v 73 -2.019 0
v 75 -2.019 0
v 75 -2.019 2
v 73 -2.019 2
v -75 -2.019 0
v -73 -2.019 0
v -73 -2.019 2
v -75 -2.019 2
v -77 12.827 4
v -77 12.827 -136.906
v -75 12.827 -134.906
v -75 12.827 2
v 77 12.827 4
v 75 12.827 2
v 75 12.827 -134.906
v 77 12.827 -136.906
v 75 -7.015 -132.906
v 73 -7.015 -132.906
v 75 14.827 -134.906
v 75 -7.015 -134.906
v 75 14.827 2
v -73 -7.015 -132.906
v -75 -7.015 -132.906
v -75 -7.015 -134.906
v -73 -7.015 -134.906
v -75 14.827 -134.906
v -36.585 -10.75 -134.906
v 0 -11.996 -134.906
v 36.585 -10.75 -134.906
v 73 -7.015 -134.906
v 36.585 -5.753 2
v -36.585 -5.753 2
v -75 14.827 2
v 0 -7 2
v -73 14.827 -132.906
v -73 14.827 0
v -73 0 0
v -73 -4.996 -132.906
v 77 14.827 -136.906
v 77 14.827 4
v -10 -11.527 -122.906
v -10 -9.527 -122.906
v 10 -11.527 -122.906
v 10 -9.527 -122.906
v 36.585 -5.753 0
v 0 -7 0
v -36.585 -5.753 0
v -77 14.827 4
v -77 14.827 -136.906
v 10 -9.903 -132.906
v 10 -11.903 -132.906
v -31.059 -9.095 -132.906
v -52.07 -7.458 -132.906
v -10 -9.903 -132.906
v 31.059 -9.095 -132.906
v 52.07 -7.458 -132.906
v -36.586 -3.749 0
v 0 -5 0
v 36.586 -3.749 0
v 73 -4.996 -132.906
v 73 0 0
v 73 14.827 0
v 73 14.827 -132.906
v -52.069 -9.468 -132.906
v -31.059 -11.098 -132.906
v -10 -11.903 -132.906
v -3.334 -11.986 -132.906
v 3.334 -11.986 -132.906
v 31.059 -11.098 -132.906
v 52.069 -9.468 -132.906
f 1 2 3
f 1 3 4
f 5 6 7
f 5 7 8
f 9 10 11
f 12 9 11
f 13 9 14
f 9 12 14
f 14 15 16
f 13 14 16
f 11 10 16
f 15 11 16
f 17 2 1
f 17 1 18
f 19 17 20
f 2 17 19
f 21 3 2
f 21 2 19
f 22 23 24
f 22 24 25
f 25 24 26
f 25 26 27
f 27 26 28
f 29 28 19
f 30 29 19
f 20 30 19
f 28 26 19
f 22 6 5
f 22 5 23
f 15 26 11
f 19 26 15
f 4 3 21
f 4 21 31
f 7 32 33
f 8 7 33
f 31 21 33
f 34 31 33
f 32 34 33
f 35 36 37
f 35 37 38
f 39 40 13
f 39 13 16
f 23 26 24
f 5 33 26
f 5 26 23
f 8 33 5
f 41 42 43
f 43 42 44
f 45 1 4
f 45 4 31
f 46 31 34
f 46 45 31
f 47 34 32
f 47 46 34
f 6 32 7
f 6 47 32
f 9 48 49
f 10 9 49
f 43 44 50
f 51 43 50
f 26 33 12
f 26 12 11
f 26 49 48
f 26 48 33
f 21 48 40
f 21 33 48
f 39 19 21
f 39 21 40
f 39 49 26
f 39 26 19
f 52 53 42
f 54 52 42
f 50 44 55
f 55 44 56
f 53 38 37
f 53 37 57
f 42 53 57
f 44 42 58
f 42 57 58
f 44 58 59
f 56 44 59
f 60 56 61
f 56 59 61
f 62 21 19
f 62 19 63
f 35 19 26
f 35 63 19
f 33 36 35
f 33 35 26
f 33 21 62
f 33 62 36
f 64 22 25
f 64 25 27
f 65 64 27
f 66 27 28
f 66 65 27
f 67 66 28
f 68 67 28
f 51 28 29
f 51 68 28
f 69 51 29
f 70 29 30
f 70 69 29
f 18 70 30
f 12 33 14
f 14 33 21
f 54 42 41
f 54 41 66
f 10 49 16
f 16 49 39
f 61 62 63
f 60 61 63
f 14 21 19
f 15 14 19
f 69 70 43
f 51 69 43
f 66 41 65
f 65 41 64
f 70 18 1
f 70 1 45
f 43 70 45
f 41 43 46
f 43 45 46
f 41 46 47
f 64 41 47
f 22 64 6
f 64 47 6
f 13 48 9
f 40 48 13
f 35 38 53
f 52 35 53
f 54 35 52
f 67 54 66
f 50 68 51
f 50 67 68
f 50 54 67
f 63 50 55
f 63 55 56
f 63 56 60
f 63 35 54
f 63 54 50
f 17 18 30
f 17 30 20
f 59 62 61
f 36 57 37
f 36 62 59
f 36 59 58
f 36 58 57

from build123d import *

# Parameters (mm, degrees)
BOSS_EXTRUDE1_DEPTH = 133
BOSS_EXTRUDE2_DEPTH = 2
LPATTERN1_COUNT     = 2
LPATTERN1_PITCH     = 148
BOSS_EXTRUDE3_DEPTH = 2
BOSS_EXTRUDE4_DEPTH = 2
SKETCH10_W          = 154
SKETCH10_H          = 140.906114543
SKETCH10_W_2        = 150
SKETCH10_H_2        = 136.906114543
BOSS_EXTRUDE5_DEPTH = 2
SKETCH11_W          = 20
SKETCH11_H          = 10
CUT_EXTRUDE1_DEPTH  = 160.348074773


with BuildPart() as part:
    # Sketch1 → Boss-Extrude1 (new, along a direction that is not the sketch's normal)
    with BuildSketch(Plane.XY):
        with BuildLine():
            Line((73, 0), (73, -2.018782539))
            ThreePointArc((73, -2.018782539), (0, -7), (-73, -2.018782539))
            Line((-73, -2.018782539), (-73, 0))
            ThreePointArc((-73, 0), (0, -5), (73, 0))
        make_face()
    extrude(amount=-BOSS_EXTRUDE1_DEPTH, dir=(0, 0.03756744715435067, 0.9992940943057279))

    # Sketch3 → Boss-Extrude2 (add)
    with BuildSketch(Plane.ZY.offset(73)):
        Polygon((-132.906114543, -4.996470472), (-132.906114543, 14.827487749), (0, 14.827487749), (0, -2.018782539), (-132.906114543, -7.01525301), align=None)
    boss_extrude2 = extrude(amount=BOSS_EXTRUDE2_DEPTH)

    # LPattern1: Boss-Extrude2 ×2
    with Locations(*[(i * LPATTERN1_PITCH, 0, 0) for i in range(1, LPATTERN1_COUNT)]):
        add(boss_extrude2)

    # Sketch6 → Boss-Extrude3 (add)
    with BuildSketch(Plane.XY):
        with BuildLine():
            Line((-73, 14.827487749), (73, 14.827487749))
            Line((73, 14.827487749), (75, 14.827487749))
            Line((75, 14.827487749), (75, -2.018782539))
            Line((75, -2.018782539), (73, -2.018782539))
            ThreePointArc((73, -2.018782539), (0, -7), (-73, -2.018782539))
            Line((-73, -2.018782539), (-75, -2.018782539))
            Line((-75, -2.018782539), (-75, 14.827487749))
            Line((-75, 14.827487749), (-73, 14.827487749))
        make_face()
    extrude(amount=BOSS_EXTRUDE3_DEPTH)

    # Sketch7 → Boss-Extrude4 (add)
    with BuildSketch(Plane(origin=(0, 0, -132.906114543), x_dir=(-1, 0, 0), z_dir=(0, 0, -1))):
        with BuildLine():
            Line((-73, 14.827487749), (73, 14.827487749))
            Line((73, 14.827487749), (75, 14.827487749))
            Line((75, 14.827487749), (75, -7.01525301))
            Line((75, -7.01525301), (73, -7.01525301))
            ThreePointArc((73, -7.01525301), (0, -11.996470472), (-73, -7.01525301))
            Line((-73, -7.01525301), (-75, -7.01525301))
            Line((-75, -7.01525301), (-75, 14.827487749))
            Line((-75, 14.827487749), (-73, 14.827487749))
        make_face()
    extrude(amount=BOSS_EXTRUDE4_DEPTH)

    # Sketch11 → Cut-Extrude1 (cut, through all)
    with BuildSketch(Plane(origin=(0, 14.827487749, 0), x_dir=(1, 0, 0), z_dir=(0, 1, 0))):
        with Locations((0, 127.906114543)):
            Rectangle(SKETCH11_W, SKETCH11_H)
    extrude(amount=-CUT_EXTRUDE1_DEPTH, mode=Mode.SUBTRACT)


with BuildPart() as body_2:
    # Sketch10 → Boss-Extrude5 (new body)
    with BuildSketch(Plane(origin=(0, 14.827487749, 0), x_dir=(1, 0, 0), z_dir=(0, 1, 0))):
        with Locations((0, 66.453057272)):
            Rectangle(SKETCH10_W, SKETCH10_H)
        with Locations((0, 66.453057272)):
            Rectangle(SKETCH10_W_2, SKETCH10_H_2, mode=Mode.SUBTRACT)
    extrude(amount=-BOSS_EXTRUDE5_DEPTH)


solid = Compound([part.part, body_2.part])
